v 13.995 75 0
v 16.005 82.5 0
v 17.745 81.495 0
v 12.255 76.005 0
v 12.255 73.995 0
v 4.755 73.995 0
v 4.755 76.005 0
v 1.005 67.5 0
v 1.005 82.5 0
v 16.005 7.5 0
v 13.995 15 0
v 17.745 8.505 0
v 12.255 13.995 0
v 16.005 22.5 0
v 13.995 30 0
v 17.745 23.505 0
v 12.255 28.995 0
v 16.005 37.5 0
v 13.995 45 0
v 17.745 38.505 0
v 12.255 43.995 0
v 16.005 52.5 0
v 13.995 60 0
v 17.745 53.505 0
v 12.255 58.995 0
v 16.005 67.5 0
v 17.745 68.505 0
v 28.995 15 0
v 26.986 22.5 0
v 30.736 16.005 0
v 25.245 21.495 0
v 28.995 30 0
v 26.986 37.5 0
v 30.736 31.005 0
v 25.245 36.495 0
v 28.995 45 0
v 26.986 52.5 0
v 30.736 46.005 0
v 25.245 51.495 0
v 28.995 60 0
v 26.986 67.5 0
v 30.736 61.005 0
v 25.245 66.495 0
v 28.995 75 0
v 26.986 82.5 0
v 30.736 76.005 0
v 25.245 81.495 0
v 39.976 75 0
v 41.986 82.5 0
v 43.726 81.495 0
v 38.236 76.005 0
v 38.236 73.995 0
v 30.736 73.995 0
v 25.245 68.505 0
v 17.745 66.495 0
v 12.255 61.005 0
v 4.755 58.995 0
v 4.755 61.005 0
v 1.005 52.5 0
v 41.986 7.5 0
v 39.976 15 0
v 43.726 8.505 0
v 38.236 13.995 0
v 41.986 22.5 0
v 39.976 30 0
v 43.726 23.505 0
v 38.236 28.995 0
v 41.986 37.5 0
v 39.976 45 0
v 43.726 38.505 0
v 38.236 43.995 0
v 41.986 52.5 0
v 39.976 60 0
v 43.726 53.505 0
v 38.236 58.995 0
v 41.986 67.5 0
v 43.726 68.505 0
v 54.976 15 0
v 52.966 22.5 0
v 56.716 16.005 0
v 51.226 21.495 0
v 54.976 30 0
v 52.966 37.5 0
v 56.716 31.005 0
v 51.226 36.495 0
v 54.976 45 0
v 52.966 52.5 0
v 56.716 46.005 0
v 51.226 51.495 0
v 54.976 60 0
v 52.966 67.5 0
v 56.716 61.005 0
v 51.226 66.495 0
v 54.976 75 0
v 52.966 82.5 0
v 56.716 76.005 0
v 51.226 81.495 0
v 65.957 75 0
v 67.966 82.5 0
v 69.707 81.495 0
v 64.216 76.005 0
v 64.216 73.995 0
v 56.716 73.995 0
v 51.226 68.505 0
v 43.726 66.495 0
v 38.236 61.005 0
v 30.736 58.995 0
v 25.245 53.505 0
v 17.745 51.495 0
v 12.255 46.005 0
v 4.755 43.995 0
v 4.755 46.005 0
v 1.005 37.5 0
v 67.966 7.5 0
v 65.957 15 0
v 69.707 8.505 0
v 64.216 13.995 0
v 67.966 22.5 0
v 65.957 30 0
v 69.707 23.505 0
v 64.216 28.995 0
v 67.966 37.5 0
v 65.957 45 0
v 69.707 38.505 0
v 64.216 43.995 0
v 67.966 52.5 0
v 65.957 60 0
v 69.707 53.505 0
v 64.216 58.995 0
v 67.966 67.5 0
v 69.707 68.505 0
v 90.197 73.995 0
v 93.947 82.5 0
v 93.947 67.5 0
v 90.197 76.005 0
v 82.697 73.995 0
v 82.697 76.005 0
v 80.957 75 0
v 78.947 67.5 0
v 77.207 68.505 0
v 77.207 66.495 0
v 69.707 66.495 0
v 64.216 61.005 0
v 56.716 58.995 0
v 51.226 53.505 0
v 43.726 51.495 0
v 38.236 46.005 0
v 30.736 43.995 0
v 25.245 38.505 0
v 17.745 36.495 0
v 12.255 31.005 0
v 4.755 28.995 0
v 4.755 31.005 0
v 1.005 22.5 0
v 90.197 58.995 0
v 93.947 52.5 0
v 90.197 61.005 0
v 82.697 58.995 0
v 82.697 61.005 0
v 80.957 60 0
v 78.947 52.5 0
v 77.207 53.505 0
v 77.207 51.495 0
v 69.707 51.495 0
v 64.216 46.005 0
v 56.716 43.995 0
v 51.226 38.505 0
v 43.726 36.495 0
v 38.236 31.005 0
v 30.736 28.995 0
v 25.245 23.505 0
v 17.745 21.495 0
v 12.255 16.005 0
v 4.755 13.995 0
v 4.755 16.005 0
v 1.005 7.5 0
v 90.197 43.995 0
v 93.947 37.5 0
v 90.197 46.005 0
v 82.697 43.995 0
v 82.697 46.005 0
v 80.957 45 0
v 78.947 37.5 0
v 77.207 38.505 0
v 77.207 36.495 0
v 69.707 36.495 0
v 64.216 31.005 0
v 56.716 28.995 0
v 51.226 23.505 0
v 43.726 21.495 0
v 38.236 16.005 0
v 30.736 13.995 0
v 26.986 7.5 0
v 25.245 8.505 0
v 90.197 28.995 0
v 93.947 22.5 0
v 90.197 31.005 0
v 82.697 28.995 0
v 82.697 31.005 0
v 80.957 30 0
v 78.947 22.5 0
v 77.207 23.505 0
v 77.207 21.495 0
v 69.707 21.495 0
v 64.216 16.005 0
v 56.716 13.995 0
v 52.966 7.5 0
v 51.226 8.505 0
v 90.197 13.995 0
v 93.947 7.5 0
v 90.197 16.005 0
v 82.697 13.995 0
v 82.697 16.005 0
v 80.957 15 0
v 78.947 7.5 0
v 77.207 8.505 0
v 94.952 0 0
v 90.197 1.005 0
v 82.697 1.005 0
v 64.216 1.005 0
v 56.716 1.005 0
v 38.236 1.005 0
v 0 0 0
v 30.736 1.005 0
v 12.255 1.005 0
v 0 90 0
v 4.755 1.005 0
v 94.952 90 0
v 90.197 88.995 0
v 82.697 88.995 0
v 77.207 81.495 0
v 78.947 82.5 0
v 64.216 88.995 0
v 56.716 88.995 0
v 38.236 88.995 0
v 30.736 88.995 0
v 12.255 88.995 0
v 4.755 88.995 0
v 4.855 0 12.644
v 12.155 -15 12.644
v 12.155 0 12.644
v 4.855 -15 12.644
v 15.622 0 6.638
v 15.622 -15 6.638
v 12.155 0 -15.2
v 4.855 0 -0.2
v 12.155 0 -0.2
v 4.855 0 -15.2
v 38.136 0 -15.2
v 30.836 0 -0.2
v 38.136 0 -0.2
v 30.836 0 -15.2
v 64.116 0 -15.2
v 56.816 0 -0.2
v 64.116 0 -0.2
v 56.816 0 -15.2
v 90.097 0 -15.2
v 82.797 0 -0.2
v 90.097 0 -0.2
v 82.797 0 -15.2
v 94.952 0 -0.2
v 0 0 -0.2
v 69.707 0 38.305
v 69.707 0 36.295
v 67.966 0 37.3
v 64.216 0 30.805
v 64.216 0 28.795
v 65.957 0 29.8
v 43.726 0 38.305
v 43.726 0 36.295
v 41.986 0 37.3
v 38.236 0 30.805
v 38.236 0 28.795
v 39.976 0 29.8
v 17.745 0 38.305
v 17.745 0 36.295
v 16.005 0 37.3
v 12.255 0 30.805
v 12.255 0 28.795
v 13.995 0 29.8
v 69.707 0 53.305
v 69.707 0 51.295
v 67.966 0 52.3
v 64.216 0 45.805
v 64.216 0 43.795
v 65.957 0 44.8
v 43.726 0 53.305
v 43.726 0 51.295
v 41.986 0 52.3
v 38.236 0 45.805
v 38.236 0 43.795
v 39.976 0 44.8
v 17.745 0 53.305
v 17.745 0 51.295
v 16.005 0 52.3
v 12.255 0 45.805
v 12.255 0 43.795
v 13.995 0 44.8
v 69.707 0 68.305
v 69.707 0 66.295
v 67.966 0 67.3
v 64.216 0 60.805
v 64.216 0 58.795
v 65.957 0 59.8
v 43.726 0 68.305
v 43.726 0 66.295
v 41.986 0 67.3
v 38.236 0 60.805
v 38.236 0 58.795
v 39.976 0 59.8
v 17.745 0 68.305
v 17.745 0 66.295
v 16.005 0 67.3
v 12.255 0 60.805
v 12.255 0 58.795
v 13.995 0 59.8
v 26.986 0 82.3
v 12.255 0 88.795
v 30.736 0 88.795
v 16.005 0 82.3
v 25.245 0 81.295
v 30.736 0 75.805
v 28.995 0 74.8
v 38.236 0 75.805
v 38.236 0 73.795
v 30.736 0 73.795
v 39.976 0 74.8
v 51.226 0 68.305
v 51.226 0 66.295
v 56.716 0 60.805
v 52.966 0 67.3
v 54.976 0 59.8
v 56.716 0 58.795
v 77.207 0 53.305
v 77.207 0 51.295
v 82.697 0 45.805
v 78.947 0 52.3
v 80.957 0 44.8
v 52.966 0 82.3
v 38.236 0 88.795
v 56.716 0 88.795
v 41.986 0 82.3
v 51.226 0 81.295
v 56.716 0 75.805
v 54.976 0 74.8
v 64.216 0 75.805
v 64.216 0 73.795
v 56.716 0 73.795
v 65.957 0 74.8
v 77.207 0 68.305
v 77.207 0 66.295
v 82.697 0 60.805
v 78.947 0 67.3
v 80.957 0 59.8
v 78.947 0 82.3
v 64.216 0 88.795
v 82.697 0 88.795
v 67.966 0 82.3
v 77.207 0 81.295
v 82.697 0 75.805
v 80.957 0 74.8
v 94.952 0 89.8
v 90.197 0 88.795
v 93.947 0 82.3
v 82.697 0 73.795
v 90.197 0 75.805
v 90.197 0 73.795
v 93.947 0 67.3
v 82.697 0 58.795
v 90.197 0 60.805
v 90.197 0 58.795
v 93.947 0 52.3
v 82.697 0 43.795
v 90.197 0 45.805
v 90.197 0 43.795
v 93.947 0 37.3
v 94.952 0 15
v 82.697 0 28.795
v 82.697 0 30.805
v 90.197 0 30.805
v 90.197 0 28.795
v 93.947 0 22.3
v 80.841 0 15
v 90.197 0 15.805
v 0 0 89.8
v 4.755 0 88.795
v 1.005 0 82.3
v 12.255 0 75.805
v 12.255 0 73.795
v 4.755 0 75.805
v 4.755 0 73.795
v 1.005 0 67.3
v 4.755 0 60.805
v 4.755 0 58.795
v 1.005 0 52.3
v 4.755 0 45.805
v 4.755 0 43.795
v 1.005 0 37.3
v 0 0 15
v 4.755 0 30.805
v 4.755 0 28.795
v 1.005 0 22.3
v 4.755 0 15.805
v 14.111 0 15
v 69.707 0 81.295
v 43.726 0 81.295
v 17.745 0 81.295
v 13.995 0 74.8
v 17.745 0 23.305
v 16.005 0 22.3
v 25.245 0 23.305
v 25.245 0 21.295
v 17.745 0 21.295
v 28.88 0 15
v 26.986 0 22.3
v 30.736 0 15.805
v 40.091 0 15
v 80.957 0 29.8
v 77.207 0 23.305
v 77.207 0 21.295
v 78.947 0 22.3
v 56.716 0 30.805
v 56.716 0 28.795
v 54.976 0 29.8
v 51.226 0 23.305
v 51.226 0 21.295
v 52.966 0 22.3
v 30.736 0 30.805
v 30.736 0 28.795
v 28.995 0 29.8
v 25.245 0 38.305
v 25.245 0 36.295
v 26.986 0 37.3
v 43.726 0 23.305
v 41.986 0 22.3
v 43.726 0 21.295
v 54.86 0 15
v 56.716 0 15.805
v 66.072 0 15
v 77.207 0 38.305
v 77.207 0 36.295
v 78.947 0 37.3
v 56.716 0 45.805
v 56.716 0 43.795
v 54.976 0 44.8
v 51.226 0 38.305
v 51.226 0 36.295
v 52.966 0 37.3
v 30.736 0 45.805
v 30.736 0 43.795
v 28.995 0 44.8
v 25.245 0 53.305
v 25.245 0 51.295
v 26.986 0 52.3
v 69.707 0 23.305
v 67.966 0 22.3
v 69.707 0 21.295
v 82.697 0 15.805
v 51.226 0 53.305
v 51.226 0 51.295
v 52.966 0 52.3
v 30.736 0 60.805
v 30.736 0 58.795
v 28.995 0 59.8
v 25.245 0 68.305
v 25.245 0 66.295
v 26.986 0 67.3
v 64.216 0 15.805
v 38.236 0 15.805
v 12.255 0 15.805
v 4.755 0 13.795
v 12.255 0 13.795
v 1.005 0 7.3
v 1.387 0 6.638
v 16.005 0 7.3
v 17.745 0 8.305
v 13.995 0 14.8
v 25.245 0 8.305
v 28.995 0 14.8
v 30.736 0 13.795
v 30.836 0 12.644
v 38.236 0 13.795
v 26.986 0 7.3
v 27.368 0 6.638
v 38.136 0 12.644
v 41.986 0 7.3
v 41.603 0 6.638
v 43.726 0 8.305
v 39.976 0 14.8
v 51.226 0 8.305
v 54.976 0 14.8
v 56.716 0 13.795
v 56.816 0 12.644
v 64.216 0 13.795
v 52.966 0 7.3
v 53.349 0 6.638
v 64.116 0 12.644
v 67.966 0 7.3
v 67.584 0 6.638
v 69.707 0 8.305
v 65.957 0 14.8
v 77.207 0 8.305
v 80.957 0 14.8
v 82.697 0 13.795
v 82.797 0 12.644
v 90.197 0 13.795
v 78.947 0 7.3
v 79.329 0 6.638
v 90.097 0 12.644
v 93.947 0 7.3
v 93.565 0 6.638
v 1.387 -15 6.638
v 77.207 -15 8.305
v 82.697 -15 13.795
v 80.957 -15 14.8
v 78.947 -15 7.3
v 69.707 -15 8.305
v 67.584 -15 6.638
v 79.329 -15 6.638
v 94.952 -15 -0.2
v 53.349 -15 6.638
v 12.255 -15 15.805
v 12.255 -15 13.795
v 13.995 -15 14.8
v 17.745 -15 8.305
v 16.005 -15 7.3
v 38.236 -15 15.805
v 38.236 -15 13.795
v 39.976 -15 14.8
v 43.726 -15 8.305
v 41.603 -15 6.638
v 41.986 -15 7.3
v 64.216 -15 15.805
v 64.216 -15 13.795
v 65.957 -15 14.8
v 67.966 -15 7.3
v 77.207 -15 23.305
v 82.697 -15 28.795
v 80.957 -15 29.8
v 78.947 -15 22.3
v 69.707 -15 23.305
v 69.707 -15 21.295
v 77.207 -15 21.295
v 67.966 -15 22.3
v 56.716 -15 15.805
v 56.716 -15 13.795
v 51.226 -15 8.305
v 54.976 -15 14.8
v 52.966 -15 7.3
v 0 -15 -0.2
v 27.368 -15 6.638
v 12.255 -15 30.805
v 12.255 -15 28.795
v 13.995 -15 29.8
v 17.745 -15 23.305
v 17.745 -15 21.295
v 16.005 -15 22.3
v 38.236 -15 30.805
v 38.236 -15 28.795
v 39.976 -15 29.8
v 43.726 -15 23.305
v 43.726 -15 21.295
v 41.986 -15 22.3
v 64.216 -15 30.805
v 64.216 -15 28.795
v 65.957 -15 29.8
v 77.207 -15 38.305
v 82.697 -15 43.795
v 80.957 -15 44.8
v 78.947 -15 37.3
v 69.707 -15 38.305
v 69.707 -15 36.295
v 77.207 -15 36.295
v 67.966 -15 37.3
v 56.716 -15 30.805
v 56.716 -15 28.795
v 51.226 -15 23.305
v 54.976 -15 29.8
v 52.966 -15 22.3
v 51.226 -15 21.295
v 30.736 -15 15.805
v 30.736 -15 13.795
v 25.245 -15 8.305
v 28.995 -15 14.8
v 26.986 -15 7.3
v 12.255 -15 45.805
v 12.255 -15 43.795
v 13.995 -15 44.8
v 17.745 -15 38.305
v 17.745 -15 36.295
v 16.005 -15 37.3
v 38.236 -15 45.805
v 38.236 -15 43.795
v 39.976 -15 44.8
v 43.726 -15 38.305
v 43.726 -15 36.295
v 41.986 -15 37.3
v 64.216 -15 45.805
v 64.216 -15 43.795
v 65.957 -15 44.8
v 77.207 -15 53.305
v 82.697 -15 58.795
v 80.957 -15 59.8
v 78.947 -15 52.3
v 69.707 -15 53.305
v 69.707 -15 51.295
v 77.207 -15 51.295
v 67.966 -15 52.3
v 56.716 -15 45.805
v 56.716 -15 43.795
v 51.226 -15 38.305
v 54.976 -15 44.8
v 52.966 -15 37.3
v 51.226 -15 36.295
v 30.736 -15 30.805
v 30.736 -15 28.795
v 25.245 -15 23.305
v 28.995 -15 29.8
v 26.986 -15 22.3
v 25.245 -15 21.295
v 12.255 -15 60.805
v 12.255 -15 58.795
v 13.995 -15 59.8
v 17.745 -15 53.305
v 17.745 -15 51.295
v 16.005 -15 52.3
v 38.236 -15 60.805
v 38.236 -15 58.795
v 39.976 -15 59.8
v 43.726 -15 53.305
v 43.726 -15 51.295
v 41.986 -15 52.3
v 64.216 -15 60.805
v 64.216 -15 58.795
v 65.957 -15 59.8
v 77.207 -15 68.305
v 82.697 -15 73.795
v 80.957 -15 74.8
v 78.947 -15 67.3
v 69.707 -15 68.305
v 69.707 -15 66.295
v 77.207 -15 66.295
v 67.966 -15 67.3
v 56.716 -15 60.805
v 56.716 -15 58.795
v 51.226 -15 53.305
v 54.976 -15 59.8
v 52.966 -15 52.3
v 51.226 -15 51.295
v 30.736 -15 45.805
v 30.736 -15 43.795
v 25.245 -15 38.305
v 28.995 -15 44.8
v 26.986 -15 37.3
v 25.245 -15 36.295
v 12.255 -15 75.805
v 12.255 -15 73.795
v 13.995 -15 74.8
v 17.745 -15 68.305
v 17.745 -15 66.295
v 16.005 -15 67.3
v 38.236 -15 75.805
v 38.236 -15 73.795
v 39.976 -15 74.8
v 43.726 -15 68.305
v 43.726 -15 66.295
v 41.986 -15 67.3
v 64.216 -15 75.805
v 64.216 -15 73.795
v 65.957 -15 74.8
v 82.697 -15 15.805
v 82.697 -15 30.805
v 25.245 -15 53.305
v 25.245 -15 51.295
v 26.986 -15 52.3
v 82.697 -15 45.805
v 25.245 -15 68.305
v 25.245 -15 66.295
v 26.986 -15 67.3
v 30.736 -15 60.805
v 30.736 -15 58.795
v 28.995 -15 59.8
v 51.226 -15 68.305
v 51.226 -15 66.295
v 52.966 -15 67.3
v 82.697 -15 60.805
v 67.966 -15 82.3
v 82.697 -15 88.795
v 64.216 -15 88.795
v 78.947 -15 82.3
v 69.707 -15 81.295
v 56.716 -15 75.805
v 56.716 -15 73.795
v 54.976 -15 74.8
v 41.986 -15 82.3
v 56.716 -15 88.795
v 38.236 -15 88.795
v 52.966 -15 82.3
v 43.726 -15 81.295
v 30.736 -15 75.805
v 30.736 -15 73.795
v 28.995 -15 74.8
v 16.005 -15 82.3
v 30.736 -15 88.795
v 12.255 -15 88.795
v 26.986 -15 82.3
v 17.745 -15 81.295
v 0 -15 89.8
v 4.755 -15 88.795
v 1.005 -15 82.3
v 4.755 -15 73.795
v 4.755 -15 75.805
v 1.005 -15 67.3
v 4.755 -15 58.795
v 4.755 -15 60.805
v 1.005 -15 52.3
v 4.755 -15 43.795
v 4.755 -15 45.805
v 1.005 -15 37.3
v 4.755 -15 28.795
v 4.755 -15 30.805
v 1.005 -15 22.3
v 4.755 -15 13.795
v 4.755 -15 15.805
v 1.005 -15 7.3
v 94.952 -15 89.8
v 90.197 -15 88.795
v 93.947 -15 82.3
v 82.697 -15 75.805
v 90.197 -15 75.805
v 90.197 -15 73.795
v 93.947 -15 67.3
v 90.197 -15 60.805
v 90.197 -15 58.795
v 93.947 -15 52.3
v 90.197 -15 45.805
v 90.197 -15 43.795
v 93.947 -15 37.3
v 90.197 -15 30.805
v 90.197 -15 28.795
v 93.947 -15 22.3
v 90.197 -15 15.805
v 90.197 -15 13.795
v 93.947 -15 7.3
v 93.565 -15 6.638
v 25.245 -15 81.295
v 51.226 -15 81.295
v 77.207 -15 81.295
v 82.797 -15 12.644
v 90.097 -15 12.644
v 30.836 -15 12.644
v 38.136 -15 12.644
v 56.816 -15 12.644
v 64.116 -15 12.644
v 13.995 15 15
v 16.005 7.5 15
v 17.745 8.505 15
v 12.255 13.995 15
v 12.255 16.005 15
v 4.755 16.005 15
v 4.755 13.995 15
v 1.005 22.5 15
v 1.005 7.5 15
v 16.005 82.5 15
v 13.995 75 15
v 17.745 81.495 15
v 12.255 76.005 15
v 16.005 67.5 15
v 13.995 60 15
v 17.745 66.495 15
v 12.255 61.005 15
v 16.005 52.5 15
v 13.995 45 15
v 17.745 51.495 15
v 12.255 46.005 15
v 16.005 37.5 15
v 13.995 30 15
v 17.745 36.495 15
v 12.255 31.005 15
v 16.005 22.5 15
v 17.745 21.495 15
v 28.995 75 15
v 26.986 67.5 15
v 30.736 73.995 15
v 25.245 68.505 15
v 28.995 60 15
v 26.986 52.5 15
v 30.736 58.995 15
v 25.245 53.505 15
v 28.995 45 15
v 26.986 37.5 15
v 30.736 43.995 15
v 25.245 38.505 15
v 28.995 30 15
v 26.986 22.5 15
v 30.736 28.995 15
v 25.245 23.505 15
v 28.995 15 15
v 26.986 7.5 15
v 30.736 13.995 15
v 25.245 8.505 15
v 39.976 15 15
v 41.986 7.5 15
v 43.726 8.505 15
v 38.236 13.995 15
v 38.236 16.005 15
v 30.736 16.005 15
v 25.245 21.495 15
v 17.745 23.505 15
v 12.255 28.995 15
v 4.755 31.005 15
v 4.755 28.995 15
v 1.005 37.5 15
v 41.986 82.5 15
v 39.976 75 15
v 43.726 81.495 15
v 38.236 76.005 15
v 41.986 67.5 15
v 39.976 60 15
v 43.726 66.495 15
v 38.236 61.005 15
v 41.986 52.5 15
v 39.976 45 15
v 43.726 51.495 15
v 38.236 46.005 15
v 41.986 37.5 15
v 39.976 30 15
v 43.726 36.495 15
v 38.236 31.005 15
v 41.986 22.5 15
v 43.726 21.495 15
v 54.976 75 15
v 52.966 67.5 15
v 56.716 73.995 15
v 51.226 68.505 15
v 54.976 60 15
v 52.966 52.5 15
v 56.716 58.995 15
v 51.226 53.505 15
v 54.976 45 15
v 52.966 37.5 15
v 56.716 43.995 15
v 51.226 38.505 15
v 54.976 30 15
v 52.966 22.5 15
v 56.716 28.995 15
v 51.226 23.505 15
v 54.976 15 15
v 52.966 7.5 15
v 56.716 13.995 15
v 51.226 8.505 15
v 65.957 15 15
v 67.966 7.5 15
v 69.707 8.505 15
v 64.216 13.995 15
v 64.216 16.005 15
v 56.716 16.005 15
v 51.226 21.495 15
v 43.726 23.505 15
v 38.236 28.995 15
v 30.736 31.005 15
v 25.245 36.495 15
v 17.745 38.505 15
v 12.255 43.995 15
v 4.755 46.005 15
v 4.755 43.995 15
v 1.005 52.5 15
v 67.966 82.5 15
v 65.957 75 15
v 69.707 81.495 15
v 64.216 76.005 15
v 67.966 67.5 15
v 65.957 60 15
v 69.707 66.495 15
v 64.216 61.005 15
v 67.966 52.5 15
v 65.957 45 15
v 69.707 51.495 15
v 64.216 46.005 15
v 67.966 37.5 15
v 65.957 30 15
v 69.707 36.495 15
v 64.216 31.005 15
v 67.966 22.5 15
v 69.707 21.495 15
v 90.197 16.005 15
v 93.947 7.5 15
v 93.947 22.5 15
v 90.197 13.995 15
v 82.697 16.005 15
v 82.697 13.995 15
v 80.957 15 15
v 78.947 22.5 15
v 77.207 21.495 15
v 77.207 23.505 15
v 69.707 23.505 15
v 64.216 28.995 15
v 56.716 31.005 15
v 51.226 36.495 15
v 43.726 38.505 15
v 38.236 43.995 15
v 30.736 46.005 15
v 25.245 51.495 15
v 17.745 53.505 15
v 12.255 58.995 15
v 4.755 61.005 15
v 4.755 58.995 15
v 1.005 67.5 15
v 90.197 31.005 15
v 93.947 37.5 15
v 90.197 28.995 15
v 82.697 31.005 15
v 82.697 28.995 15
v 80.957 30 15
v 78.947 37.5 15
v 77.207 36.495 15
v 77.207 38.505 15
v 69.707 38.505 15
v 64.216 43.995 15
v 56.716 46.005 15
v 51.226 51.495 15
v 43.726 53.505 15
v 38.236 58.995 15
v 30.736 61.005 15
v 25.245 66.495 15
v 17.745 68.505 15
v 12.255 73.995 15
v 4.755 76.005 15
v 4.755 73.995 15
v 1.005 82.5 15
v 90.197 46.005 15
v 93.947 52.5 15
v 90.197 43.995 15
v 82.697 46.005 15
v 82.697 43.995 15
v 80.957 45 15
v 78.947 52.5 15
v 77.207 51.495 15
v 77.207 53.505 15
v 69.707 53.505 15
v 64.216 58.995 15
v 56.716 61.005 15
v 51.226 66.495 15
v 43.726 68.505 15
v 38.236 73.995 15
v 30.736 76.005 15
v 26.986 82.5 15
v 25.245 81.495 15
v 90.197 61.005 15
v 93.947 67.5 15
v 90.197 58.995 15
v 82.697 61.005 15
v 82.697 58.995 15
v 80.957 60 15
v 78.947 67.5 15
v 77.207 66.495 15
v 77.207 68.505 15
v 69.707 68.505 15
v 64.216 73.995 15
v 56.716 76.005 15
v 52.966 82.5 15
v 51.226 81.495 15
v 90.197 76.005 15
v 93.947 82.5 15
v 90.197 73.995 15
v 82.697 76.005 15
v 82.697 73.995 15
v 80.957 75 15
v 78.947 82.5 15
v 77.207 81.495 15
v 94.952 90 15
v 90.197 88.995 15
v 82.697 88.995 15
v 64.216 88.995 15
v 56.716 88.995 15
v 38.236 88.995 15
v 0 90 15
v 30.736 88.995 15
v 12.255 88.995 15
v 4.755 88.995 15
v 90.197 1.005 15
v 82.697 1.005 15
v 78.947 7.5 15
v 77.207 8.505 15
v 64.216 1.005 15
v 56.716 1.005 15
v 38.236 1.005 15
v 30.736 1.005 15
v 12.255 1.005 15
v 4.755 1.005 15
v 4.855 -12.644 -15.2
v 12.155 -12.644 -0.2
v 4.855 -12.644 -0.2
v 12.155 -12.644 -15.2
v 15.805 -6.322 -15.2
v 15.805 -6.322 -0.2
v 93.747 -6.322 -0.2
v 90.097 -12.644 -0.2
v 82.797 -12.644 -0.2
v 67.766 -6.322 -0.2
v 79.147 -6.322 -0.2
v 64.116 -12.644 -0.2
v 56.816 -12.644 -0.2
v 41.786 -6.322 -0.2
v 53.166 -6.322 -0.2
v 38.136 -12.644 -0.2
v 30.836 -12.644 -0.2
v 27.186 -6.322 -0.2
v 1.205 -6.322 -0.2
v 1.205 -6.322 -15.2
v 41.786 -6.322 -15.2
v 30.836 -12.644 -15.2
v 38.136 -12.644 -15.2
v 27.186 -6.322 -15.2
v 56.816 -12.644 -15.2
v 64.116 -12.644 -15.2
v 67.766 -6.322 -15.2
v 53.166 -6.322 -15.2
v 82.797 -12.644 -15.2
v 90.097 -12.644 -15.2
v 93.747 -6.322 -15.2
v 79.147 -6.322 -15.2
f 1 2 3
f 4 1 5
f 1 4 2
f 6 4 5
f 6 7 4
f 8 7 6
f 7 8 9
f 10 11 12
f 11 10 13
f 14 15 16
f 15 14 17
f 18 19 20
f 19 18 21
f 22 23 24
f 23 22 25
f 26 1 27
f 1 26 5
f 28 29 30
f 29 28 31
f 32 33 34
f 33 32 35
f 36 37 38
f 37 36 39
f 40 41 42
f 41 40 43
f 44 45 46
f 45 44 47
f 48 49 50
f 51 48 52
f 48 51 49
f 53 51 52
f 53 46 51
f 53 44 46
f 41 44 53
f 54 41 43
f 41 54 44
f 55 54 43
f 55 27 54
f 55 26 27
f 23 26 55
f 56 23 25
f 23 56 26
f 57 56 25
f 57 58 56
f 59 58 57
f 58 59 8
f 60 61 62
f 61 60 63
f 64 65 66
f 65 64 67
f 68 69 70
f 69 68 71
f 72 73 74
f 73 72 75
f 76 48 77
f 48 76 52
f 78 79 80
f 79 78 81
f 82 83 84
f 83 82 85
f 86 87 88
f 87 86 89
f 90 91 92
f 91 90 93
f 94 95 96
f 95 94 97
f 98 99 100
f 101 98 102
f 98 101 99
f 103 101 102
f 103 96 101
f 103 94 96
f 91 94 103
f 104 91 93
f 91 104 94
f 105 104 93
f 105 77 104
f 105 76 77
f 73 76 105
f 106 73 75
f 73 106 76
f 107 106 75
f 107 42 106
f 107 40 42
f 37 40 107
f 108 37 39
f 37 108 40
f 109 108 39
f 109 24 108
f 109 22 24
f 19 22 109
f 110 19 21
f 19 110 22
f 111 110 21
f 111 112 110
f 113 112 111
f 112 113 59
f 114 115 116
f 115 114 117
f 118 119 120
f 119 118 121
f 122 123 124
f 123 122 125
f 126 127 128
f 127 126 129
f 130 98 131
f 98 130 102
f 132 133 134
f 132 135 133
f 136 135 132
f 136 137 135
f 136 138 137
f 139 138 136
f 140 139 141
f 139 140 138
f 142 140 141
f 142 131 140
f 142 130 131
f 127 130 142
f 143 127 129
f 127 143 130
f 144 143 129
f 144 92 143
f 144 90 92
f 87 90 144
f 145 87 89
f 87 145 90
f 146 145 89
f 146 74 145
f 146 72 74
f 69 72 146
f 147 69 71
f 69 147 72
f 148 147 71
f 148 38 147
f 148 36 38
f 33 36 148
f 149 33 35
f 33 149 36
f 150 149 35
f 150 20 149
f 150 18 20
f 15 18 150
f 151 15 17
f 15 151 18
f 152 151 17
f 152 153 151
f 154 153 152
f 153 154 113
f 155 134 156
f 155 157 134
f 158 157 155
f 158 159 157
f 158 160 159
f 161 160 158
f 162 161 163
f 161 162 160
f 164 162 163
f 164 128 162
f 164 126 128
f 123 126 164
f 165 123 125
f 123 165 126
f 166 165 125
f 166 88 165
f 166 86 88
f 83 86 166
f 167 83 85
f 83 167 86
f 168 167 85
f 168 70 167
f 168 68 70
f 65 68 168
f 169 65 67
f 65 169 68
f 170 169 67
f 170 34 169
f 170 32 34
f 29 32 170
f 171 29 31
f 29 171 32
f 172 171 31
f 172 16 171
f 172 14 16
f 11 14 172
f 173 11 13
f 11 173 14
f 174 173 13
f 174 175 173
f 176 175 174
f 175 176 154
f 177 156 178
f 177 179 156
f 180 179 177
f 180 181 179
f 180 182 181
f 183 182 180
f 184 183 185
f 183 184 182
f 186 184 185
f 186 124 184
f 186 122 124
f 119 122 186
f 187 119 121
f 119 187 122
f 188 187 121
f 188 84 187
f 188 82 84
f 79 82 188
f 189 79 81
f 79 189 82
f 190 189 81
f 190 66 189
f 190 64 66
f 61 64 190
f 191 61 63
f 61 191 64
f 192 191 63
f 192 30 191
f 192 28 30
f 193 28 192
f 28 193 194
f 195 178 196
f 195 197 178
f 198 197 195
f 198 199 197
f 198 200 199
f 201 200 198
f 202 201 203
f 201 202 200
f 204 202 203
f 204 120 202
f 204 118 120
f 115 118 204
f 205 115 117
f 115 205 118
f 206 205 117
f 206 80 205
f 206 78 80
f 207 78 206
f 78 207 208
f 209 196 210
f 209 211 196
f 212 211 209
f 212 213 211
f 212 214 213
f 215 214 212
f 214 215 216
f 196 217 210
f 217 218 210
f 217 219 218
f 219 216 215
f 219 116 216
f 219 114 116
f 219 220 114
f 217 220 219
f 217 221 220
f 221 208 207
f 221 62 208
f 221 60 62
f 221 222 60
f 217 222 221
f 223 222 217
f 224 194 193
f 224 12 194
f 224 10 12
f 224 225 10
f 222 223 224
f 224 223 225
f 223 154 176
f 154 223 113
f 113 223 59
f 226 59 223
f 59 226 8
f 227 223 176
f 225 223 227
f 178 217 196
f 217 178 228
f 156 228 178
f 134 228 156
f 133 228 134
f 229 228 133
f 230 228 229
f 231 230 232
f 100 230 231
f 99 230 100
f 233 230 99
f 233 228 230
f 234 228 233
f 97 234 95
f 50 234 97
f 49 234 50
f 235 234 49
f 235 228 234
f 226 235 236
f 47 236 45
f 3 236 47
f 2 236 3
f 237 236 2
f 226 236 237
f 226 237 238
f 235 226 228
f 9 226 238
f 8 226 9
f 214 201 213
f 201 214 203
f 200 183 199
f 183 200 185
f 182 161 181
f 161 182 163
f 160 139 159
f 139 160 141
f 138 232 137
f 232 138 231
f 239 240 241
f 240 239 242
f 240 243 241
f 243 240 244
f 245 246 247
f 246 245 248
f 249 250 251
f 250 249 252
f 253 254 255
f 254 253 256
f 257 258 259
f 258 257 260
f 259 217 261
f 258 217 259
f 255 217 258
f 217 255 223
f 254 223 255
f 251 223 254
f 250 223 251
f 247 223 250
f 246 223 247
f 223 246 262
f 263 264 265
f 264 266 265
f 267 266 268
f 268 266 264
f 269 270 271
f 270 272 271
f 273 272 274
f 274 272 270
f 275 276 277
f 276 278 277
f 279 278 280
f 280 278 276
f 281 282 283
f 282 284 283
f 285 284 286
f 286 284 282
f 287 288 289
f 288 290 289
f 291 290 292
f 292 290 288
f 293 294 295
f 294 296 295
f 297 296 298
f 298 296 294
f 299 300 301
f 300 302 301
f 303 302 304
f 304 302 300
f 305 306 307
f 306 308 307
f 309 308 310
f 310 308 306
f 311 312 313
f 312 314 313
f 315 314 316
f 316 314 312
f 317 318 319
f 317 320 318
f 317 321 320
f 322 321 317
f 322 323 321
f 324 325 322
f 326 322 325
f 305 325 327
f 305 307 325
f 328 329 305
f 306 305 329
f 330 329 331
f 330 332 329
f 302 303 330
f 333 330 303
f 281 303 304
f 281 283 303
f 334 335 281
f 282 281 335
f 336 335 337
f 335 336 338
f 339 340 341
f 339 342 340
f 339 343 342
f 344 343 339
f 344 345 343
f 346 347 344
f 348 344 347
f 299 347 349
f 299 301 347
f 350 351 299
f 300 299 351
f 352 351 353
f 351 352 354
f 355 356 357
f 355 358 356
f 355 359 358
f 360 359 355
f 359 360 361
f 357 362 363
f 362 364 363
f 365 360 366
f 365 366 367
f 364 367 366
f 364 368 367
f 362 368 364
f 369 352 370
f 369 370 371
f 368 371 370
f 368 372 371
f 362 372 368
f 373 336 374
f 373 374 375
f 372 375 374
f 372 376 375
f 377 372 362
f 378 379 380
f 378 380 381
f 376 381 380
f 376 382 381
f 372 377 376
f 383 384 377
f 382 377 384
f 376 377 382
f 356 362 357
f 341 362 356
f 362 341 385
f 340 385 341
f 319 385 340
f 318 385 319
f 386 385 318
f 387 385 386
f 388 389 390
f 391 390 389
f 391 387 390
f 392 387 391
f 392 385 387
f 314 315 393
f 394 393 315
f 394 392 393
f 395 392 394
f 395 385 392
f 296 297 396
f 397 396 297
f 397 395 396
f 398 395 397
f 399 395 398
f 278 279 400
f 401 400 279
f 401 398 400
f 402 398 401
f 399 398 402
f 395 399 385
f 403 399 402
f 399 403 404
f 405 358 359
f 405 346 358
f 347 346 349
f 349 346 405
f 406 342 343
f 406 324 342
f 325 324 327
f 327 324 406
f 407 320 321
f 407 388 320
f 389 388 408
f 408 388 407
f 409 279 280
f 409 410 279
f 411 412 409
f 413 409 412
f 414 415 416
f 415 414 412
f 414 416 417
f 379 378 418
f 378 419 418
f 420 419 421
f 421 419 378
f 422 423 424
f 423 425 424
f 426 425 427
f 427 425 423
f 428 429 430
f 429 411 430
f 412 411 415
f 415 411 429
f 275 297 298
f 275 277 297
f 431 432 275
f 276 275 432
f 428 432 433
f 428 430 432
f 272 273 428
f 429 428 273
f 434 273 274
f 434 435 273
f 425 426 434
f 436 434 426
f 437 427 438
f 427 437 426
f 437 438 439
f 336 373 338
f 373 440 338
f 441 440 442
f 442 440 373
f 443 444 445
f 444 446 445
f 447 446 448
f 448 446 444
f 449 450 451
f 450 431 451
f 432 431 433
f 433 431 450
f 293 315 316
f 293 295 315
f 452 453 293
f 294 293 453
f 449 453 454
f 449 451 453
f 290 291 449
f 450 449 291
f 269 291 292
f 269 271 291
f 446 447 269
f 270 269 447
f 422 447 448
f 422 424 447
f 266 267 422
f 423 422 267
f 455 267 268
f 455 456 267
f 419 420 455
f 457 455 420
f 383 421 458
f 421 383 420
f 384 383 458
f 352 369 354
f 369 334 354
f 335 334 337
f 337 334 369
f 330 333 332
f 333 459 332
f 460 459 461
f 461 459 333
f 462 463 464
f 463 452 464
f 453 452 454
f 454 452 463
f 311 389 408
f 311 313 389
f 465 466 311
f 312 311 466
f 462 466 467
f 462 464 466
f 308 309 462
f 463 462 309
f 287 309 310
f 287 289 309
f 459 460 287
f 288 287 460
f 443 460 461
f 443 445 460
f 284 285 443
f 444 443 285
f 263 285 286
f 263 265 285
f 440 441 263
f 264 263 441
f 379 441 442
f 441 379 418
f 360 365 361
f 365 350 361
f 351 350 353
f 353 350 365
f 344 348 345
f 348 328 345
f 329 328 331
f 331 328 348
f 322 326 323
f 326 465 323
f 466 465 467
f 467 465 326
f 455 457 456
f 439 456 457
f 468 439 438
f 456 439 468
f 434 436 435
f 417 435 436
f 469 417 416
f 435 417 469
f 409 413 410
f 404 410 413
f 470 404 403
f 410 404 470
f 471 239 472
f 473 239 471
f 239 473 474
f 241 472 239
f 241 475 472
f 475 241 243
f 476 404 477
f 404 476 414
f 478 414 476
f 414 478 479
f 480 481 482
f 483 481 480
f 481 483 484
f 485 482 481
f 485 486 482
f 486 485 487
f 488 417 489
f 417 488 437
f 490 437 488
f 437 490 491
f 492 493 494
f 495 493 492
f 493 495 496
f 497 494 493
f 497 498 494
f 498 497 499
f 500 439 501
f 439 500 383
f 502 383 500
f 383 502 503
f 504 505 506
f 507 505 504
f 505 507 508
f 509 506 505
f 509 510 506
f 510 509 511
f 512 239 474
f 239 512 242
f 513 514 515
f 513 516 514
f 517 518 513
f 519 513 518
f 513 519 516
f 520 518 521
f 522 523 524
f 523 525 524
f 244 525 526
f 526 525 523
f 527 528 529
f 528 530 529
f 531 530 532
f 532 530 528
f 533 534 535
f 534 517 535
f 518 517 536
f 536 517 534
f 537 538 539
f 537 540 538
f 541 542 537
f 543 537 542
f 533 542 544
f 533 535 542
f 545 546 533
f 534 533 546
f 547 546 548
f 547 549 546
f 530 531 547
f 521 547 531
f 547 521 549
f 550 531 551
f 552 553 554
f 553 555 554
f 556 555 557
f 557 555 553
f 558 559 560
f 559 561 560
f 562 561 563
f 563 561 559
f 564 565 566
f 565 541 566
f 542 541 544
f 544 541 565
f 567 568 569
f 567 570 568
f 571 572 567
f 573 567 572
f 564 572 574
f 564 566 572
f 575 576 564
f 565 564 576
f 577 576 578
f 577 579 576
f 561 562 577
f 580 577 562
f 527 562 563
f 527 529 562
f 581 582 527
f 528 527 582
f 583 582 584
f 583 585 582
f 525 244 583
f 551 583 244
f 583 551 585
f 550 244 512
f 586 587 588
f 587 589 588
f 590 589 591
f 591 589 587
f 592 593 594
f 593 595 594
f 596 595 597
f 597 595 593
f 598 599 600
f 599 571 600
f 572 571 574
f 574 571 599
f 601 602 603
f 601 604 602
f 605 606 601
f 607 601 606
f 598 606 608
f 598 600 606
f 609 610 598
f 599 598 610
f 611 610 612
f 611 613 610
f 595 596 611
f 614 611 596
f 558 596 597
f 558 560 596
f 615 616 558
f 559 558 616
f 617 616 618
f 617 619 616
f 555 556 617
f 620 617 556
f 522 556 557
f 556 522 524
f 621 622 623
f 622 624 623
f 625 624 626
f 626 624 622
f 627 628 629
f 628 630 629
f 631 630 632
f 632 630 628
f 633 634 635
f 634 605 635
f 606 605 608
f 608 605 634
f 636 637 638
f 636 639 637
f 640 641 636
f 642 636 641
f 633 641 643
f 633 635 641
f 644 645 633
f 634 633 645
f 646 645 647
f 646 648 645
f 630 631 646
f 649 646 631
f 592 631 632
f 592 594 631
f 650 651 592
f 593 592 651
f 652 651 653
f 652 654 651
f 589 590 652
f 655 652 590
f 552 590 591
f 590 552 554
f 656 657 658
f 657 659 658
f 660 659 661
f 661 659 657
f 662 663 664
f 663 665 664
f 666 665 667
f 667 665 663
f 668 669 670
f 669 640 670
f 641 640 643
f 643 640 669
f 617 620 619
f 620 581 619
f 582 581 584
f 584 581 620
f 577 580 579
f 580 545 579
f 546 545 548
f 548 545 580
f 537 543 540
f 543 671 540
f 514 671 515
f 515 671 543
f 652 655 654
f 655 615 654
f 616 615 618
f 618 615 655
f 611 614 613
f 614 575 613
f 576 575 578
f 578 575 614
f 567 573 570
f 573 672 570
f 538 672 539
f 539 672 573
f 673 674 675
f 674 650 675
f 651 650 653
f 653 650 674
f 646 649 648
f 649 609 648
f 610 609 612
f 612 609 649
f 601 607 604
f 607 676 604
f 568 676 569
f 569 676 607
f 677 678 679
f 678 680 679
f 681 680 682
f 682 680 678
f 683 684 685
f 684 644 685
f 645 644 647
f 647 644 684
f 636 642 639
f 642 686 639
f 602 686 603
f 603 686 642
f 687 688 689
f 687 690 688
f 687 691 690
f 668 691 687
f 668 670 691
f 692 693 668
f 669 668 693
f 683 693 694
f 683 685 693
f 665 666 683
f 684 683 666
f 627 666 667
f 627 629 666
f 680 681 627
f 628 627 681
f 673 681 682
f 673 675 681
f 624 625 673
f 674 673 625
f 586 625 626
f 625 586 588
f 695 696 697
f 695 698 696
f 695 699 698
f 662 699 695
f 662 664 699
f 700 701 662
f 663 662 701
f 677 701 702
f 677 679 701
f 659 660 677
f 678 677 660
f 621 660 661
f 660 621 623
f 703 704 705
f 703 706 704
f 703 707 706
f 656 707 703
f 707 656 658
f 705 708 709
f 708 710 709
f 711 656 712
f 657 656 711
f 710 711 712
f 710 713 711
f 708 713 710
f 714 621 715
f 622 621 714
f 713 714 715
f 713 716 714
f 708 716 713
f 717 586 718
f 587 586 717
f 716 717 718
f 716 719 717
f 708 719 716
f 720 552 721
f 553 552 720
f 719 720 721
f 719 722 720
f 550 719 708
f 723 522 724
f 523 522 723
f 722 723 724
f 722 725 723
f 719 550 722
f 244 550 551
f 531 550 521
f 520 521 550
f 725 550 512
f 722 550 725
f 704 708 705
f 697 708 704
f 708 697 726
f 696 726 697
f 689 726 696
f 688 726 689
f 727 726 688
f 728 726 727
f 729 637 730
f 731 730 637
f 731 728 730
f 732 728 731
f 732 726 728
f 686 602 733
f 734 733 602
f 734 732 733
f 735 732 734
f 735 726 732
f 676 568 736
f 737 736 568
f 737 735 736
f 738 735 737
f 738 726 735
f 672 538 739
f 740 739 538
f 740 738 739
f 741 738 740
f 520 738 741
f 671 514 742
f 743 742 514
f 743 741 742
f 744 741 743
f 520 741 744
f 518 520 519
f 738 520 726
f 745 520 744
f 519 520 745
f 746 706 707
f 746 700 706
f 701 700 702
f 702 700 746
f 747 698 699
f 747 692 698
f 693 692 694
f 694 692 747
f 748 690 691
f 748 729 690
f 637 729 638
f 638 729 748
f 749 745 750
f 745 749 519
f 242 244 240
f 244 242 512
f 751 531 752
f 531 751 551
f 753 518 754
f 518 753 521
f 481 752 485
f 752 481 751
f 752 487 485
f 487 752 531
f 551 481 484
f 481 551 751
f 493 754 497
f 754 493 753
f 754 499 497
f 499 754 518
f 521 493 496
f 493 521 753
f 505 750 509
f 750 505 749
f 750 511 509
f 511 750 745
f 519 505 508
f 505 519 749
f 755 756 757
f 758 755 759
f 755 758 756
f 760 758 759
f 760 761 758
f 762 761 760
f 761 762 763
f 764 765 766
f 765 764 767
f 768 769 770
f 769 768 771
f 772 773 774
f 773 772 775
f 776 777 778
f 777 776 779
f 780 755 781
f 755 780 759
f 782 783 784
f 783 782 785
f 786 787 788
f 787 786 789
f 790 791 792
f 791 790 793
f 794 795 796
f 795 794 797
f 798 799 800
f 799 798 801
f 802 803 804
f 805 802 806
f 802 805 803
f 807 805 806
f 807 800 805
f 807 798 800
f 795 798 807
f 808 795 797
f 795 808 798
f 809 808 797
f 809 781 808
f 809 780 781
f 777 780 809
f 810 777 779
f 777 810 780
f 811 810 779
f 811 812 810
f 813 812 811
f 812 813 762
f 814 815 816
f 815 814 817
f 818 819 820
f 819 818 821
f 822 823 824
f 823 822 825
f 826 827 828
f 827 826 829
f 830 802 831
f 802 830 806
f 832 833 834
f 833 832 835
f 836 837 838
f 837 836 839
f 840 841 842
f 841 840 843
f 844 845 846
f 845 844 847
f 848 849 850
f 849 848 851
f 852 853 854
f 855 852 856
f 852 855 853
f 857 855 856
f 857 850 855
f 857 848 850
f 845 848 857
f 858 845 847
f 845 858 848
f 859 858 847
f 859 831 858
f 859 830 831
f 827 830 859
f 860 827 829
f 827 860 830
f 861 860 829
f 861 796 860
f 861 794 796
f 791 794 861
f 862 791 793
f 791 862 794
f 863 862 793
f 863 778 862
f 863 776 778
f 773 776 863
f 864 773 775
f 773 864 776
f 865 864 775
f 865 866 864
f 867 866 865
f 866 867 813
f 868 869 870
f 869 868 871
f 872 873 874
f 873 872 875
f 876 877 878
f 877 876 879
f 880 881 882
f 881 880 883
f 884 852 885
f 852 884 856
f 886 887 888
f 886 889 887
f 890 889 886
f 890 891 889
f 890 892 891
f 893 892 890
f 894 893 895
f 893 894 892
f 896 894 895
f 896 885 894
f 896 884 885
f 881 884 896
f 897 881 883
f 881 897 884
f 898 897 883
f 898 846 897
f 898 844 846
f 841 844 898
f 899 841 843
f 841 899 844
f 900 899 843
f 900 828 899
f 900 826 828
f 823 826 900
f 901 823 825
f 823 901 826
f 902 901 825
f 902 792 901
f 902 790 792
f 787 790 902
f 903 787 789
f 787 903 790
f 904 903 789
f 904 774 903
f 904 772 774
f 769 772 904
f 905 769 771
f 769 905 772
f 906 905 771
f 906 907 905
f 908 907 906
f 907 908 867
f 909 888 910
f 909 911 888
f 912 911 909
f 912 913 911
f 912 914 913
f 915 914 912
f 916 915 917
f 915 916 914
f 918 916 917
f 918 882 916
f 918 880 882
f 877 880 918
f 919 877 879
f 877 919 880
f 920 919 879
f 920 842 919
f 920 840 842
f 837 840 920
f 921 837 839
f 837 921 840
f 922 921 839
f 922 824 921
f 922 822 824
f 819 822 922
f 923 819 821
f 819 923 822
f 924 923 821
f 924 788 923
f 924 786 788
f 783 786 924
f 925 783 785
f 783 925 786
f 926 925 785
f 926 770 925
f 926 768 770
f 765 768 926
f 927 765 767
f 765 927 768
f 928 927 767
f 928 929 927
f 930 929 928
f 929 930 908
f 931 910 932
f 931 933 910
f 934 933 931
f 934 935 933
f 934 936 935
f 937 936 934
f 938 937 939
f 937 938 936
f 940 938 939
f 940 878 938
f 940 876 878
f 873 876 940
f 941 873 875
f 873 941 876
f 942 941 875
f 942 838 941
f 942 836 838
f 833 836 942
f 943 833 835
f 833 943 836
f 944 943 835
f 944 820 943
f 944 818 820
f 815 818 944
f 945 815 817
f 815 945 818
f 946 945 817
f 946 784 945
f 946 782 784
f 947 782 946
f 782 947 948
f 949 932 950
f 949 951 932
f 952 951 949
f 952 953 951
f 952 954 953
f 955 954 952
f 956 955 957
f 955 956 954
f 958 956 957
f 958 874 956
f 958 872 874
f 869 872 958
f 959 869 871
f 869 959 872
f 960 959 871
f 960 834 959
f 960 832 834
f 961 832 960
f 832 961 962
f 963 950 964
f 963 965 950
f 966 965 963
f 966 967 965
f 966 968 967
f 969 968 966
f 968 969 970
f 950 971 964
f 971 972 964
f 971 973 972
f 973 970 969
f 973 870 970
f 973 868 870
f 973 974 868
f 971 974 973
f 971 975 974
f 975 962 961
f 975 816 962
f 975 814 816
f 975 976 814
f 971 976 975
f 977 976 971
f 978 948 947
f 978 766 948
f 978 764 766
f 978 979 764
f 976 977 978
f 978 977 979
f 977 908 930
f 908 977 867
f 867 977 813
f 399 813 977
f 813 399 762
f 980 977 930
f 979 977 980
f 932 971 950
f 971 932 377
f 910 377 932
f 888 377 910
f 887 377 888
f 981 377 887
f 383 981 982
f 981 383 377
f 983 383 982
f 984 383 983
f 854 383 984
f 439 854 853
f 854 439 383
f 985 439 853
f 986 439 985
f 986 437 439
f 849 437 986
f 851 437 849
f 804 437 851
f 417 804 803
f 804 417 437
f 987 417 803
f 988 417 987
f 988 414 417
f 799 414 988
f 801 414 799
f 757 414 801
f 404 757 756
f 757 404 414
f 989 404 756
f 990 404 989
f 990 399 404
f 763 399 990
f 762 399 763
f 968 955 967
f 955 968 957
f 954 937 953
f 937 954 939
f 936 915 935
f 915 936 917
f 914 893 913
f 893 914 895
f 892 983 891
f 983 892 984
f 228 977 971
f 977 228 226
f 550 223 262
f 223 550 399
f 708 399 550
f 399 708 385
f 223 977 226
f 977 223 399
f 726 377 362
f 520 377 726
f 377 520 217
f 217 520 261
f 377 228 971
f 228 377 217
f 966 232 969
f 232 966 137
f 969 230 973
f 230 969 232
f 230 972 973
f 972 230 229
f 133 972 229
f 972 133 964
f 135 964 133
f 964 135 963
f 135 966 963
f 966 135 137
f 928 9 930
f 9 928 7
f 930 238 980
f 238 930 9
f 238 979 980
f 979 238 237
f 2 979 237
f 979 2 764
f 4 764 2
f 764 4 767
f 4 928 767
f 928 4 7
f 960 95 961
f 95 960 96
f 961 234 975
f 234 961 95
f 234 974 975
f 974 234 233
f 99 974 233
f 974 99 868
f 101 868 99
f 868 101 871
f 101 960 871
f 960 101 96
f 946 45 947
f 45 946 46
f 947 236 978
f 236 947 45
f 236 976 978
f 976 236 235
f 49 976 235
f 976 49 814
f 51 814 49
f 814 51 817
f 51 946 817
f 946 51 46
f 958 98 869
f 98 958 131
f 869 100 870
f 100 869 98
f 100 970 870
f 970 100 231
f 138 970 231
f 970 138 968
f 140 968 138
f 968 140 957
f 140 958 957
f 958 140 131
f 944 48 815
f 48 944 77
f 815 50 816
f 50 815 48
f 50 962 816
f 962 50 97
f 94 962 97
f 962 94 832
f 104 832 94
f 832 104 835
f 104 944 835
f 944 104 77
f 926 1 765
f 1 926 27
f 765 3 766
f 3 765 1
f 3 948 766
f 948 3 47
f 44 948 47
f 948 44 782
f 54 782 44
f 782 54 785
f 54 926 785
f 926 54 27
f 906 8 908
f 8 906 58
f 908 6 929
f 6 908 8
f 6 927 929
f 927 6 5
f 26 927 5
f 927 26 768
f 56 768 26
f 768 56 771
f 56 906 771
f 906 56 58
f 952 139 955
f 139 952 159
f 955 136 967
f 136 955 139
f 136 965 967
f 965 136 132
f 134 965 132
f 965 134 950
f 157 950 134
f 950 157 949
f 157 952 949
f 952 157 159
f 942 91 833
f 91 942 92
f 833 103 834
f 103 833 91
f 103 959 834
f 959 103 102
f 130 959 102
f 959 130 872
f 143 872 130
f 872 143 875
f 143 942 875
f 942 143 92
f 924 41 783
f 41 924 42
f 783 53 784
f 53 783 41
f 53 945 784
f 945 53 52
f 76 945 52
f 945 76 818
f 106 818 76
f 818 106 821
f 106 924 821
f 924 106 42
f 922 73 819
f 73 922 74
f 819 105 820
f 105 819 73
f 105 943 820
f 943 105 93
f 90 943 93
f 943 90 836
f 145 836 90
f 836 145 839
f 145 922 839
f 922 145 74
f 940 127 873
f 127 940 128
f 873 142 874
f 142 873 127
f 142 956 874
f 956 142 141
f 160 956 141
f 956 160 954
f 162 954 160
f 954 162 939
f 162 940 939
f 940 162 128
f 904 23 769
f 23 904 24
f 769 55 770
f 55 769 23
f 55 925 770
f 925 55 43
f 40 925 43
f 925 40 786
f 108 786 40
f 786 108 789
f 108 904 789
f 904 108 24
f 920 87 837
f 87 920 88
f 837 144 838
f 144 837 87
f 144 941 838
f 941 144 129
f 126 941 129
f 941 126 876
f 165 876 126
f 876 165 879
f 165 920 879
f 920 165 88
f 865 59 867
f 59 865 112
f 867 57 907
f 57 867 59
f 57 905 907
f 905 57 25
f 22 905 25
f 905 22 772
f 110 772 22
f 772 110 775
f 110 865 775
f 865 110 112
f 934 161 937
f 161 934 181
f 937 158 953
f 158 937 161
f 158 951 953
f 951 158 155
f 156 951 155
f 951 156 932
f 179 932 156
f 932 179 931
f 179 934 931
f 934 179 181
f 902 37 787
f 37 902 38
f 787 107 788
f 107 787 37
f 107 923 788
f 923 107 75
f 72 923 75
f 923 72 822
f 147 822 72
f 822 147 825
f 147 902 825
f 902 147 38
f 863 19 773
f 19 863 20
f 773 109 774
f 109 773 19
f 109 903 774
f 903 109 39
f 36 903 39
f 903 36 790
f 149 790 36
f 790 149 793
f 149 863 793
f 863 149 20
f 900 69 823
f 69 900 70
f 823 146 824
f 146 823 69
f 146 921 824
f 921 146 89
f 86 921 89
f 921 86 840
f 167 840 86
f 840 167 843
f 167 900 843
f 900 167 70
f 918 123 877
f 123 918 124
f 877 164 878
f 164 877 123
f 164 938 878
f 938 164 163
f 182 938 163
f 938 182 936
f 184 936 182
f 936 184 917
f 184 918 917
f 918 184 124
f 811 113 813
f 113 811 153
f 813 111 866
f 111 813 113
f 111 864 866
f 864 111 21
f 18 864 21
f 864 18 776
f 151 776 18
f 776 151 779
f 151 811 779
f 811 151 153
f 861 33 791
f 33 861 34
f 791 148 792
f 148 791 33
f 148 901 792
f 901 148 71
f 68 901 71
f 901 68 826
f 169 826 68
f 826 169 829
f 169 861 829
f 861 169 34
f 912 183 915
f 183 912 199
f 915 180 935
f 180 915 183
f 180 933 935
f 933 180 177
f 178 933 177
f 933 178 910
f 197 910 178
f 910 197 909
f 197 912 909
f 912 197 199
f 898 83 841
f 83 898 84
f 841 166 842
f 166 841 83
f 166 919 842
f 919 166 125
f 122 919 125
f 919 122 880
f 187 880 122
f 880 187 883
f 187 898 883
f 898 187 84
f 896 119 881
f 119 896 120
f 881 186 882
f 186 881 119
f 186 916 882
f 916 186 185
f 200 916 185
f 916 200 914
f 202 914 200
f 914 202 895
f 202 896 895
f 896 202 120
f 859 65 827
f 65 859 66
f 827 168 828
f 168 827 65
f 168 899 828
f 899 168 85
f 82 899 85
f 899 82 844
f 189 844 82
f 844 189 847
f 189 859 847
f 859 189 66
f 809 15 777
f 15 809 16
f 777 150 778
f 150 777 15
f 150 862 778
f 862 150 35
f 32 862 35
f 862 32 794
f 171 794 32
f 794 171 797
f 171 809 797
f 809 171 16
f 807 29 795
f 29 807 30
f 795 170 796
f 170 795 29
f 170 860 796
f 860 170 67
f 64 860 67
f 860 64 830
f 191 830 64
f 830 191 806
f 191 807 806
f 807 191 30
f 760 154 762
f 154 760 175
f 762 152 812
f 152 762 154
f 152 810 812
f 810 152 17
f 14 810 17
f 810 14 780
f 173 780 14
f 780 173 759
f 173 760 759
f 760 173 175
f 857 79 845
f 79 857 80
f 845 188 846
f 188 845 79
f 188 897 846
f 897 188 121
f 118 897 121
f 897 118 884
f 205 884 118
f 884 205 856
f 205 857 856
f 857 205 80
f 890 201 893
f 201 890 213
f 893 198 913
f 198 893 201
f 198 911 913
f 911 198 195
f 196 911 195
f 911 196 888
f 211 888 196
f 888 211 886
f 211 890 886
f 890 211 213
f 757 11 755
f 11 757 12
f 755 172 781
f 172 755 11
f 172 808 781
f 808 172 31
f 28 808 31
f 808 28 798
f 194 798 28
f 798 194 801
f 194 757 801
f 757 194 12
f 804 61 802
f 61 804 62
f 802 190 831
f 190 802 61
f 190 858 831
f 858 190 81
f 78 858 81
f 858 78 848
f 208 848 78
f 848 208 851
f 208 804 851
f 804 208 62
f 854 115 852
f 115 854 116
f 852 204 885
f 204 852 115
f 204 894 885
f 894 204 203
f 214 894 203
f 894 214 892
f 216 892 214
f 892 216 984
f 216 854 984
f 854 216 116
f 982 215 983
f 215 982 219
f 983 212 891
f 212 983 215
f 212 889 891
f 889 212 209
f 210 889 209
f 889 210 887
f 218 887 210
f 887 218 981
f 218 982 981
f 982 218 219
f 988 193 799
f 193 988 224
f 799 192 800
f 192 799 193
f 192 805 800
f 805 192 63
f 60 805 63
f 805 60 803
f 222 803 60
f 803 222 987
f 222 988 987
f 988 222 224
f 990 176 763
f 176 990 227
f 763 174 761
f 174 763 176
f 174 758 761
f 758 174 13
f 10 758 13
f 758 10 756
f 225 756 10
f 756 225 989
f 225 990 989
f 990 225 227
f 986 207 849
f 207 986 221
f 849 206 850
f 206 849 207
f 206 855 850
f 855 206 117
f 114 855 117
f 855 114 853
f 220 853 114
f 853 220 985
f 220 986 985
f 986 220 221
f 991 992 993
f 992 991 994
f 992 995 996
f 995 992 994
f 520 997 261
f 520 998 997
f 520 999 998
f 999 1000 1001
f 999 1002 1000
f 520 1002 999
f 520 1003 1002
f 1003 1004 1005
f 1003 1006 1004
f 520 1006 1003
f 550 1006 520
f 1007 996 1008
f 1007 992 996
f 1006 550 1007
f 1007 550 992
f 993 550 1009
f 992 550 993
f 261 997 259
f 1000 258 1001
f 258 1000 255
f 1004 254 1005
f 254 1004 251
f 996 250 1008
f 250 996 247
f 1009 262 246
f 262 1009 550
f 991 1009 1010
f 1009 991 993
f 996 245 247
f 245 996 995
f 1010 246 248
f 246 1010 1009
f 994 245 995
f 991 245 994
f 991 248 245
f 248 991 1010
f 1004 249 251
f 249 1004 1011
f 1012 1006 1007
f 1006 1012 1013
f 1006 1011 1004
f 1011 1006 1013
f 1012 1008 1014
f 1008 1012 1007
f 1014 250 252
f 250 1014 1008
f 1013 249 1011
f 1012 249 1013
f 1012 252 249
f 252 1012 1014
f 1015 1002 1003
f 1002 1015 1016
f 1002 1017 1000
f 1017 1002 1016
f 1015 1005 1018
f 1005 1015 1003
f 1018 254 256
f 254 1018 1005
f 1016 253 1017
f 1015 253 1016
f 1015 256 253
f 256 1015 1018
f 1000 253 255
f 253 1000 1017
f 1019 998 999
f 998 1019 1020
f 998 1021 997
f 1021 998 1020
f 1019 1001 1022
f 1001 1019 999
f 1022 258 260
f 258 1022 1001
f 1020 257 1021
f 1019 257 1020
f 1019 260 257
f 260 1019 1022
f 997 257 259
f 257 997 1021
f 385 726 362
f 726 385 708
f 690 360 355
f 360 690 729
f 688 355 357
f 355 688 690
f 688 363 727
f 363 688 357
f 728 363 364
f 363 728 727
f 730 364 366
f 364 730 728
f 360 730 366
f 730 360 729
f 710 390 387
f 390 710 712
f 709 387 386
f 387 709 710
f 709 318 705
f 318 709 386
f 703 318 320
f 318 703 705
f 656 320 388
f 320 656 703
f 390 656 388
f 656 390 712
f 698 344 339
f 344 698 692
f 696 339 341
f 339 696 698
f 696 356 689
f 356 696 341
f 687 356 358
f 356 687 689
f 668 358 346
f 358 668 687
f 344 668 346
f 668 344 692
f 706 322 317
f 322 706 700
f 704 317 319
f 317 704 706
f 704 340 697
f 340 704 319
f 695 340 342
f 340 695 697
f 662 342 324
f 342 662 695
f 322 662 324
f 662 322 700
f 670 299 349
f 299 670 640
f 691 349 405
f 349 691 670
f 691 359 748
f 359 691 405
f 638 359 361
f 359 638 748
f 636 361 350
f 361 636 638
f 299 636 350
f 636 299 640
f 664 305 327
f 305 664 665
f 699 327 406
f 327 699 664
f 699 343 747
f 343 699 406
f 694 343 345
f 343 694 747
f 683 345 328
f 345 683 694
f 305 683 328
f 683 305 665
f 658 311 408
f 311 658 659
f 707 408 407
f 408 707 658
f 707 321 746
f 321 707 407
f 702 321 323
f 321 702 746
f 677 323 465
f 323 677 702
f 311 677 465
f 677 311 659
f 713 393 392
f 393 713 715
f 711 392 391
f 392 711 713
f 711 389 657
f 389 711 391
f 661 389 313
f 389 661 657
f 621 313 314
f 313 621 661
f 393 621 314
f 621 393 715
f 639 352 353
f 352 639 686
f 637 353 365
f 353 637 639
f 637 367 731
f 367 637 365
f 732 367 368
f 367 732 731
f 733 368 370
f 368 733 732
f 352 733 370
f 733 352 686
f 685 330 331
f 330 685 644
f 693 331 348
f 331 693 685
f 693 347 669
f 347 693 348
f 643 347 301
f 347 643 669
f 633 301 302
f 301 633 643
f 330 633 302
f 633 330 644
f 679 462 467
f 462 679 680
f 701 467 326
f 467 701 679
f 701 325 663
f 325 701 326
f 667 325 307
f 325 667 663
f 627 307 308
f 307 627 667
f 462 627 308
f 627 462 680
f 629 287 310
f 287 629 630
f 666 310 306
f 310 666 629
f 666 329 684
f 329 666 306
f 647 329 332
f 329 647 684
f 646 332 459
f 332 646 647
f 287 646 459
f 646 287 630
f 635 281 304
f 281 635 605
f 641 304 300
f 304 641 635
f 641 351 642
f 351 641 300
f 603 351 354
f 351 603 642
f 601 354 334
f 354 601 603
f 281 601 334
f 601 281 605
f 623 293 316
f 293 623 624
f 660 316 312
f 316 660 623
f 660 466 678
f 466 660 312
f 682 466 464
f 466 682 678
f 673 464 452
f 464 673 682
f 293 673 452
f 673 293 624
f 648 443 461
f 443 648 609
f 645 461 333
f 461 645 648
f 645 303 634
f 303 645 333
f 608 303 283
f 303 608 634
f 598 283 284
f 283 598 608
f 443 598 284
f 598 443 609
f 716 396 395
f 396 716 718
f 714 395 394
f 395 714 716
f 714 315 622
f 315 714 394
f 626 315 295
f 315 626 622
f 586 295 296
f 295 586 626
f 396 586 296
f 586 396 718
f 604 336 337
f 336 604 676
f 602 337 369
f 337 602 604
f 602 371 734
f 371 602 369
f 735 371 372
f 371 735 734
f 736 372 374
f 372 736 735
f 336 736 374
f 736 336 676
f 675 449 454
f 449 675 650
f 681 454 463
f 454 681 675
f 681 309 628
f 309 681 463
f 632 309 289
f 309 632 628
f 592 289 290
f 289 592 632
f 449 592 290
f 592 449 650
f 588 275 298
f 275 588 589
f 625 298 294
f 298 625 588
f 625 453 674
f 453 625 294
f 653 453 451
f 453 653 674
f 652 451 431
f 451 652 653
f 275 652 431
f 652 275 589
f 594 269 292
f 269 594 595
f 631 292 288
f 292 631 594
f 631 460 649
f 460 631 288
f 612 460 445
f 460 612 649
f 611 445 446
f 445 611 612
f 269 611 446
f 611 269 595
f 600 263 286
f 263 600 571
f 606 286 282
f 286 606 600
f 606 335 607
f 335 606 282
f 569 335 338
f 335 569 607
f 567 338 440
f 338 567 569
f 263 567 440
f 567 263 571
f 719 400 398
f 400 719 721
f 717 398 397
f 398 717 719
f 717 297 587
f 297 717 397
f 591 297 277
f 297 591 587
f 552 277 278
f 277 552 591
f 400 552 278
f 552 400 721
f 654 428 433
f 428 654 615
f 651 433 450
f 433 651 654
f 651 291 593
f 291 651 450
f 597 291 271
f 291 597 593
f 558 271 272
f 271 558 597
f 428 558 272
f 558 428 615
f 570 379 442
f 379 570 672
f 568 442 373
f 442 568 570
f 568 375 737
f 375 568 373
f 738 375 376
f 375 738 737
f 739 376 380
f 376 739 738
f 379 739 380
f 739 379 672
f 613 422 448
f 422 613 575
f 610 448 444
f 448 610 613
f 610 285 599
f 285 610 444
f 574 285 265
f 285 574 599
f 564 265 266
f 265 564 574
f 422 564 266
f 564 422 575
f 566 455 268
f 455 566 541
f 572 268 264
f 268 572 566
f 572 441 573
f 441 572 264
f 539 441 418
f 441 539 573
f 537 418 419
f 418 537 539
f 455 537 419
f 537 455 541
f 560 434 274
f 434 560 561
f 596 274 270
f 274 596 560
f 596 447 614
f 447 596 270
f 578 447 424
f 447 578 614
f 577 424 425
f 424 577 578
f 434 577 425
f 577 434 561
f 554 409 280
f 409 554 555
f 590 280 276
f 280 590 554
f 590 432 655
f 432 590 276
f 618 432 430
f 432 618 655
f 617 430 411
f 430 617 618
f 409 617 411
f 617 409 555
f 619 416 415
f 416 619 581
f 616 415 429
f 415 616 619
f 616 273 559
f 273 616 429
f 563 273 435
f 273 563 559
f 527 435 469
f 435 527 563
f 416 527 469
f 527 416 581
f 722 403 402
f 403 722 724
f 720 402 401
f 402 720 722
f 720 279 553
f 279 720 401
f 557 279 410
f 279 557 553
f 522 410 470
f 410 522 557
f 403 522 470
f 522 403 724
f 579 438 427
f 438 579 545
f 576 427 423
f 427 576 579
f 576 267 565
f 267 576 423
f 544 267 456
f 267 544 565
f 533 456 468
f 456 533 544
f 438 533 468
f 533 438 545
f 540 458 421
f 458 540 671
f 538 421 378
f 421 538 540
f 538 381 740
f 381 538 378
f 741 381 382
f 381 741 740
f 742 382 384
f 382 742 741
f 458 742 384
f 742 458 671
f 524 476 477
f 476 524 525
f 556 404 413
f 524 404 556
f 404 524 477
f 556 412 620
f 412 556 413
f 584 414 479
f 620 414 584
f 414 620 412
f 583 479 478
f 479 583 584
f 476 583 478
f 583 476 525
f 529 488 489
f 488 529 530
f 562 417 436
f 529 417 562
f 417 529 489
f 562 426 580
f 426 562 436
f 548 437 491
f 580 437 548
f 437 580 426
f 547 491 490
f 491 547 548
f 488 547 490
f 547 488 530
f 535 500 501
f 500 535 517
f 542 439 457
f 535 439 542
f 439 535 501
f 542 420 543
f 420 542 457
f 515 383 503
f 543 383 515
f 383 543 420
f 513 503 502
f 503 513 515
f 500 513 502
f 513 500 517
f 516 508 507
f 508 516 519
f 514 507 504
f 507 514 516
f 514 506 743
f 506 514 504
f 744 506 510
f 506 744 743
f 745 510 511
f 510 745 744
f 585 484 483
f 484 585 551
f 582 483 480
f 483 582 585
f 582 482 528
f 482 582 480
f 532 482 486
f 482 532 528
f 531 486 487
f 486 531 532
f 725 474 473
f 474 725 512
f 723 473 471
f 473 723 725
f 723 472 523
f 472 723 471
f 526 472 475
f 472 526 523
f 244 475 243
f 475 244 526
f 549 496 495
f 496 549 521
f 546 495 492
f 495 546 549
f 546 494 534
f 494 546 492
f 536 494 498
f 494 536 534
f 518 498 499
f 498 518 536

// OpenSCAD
module hexblock(cell_size=12, rows=6, cols=7, nozzle_d=0.4) {
    hex = cell_size;
    peg = hex - nozzle_d;
    dx = cell_size * cos(30);
    dy = cell_size;
    ex = cell_size - dx;
    width = ex + dx*cols + ex;
    length = dy*rows;

    linear_extrude(cell_size)
    difference() {
        square([width, length]);
        translate([ex, 0, 0]) {
            for (c = [0:2:cols-1]) {
                translate([dx*(c + 0.5), 0, 0])
                for (r = [0:rows-1]) {
                    translate([0, dy*(r + 0.5), 0]) circle(d=hex, $fn=6);
                }
            }
            for (c = [1:2:cols-1]) {
                translate([dx*(c + 0.5), 0, 0])
                for (r = [0:rows-2]) {
                    translate([0, dy*(r + 1), 0]) circle(d=hex, $fn=6);
                }
            }
        }
    }

    translate([ex, 0, 0]) {
        for (c = [0:2:cols-1])
            translate([dx*(c + 0.5), 0, peg*cos(30)/2])
                rotate([90, 0, 0])
                    cylinder(d=peg, h=cell_size, $fn=6);
    }
}

translate([0, 0, -0.2]) rotate([90, 0, 0]) color("green") hexblock(15);
hexblock(15);
